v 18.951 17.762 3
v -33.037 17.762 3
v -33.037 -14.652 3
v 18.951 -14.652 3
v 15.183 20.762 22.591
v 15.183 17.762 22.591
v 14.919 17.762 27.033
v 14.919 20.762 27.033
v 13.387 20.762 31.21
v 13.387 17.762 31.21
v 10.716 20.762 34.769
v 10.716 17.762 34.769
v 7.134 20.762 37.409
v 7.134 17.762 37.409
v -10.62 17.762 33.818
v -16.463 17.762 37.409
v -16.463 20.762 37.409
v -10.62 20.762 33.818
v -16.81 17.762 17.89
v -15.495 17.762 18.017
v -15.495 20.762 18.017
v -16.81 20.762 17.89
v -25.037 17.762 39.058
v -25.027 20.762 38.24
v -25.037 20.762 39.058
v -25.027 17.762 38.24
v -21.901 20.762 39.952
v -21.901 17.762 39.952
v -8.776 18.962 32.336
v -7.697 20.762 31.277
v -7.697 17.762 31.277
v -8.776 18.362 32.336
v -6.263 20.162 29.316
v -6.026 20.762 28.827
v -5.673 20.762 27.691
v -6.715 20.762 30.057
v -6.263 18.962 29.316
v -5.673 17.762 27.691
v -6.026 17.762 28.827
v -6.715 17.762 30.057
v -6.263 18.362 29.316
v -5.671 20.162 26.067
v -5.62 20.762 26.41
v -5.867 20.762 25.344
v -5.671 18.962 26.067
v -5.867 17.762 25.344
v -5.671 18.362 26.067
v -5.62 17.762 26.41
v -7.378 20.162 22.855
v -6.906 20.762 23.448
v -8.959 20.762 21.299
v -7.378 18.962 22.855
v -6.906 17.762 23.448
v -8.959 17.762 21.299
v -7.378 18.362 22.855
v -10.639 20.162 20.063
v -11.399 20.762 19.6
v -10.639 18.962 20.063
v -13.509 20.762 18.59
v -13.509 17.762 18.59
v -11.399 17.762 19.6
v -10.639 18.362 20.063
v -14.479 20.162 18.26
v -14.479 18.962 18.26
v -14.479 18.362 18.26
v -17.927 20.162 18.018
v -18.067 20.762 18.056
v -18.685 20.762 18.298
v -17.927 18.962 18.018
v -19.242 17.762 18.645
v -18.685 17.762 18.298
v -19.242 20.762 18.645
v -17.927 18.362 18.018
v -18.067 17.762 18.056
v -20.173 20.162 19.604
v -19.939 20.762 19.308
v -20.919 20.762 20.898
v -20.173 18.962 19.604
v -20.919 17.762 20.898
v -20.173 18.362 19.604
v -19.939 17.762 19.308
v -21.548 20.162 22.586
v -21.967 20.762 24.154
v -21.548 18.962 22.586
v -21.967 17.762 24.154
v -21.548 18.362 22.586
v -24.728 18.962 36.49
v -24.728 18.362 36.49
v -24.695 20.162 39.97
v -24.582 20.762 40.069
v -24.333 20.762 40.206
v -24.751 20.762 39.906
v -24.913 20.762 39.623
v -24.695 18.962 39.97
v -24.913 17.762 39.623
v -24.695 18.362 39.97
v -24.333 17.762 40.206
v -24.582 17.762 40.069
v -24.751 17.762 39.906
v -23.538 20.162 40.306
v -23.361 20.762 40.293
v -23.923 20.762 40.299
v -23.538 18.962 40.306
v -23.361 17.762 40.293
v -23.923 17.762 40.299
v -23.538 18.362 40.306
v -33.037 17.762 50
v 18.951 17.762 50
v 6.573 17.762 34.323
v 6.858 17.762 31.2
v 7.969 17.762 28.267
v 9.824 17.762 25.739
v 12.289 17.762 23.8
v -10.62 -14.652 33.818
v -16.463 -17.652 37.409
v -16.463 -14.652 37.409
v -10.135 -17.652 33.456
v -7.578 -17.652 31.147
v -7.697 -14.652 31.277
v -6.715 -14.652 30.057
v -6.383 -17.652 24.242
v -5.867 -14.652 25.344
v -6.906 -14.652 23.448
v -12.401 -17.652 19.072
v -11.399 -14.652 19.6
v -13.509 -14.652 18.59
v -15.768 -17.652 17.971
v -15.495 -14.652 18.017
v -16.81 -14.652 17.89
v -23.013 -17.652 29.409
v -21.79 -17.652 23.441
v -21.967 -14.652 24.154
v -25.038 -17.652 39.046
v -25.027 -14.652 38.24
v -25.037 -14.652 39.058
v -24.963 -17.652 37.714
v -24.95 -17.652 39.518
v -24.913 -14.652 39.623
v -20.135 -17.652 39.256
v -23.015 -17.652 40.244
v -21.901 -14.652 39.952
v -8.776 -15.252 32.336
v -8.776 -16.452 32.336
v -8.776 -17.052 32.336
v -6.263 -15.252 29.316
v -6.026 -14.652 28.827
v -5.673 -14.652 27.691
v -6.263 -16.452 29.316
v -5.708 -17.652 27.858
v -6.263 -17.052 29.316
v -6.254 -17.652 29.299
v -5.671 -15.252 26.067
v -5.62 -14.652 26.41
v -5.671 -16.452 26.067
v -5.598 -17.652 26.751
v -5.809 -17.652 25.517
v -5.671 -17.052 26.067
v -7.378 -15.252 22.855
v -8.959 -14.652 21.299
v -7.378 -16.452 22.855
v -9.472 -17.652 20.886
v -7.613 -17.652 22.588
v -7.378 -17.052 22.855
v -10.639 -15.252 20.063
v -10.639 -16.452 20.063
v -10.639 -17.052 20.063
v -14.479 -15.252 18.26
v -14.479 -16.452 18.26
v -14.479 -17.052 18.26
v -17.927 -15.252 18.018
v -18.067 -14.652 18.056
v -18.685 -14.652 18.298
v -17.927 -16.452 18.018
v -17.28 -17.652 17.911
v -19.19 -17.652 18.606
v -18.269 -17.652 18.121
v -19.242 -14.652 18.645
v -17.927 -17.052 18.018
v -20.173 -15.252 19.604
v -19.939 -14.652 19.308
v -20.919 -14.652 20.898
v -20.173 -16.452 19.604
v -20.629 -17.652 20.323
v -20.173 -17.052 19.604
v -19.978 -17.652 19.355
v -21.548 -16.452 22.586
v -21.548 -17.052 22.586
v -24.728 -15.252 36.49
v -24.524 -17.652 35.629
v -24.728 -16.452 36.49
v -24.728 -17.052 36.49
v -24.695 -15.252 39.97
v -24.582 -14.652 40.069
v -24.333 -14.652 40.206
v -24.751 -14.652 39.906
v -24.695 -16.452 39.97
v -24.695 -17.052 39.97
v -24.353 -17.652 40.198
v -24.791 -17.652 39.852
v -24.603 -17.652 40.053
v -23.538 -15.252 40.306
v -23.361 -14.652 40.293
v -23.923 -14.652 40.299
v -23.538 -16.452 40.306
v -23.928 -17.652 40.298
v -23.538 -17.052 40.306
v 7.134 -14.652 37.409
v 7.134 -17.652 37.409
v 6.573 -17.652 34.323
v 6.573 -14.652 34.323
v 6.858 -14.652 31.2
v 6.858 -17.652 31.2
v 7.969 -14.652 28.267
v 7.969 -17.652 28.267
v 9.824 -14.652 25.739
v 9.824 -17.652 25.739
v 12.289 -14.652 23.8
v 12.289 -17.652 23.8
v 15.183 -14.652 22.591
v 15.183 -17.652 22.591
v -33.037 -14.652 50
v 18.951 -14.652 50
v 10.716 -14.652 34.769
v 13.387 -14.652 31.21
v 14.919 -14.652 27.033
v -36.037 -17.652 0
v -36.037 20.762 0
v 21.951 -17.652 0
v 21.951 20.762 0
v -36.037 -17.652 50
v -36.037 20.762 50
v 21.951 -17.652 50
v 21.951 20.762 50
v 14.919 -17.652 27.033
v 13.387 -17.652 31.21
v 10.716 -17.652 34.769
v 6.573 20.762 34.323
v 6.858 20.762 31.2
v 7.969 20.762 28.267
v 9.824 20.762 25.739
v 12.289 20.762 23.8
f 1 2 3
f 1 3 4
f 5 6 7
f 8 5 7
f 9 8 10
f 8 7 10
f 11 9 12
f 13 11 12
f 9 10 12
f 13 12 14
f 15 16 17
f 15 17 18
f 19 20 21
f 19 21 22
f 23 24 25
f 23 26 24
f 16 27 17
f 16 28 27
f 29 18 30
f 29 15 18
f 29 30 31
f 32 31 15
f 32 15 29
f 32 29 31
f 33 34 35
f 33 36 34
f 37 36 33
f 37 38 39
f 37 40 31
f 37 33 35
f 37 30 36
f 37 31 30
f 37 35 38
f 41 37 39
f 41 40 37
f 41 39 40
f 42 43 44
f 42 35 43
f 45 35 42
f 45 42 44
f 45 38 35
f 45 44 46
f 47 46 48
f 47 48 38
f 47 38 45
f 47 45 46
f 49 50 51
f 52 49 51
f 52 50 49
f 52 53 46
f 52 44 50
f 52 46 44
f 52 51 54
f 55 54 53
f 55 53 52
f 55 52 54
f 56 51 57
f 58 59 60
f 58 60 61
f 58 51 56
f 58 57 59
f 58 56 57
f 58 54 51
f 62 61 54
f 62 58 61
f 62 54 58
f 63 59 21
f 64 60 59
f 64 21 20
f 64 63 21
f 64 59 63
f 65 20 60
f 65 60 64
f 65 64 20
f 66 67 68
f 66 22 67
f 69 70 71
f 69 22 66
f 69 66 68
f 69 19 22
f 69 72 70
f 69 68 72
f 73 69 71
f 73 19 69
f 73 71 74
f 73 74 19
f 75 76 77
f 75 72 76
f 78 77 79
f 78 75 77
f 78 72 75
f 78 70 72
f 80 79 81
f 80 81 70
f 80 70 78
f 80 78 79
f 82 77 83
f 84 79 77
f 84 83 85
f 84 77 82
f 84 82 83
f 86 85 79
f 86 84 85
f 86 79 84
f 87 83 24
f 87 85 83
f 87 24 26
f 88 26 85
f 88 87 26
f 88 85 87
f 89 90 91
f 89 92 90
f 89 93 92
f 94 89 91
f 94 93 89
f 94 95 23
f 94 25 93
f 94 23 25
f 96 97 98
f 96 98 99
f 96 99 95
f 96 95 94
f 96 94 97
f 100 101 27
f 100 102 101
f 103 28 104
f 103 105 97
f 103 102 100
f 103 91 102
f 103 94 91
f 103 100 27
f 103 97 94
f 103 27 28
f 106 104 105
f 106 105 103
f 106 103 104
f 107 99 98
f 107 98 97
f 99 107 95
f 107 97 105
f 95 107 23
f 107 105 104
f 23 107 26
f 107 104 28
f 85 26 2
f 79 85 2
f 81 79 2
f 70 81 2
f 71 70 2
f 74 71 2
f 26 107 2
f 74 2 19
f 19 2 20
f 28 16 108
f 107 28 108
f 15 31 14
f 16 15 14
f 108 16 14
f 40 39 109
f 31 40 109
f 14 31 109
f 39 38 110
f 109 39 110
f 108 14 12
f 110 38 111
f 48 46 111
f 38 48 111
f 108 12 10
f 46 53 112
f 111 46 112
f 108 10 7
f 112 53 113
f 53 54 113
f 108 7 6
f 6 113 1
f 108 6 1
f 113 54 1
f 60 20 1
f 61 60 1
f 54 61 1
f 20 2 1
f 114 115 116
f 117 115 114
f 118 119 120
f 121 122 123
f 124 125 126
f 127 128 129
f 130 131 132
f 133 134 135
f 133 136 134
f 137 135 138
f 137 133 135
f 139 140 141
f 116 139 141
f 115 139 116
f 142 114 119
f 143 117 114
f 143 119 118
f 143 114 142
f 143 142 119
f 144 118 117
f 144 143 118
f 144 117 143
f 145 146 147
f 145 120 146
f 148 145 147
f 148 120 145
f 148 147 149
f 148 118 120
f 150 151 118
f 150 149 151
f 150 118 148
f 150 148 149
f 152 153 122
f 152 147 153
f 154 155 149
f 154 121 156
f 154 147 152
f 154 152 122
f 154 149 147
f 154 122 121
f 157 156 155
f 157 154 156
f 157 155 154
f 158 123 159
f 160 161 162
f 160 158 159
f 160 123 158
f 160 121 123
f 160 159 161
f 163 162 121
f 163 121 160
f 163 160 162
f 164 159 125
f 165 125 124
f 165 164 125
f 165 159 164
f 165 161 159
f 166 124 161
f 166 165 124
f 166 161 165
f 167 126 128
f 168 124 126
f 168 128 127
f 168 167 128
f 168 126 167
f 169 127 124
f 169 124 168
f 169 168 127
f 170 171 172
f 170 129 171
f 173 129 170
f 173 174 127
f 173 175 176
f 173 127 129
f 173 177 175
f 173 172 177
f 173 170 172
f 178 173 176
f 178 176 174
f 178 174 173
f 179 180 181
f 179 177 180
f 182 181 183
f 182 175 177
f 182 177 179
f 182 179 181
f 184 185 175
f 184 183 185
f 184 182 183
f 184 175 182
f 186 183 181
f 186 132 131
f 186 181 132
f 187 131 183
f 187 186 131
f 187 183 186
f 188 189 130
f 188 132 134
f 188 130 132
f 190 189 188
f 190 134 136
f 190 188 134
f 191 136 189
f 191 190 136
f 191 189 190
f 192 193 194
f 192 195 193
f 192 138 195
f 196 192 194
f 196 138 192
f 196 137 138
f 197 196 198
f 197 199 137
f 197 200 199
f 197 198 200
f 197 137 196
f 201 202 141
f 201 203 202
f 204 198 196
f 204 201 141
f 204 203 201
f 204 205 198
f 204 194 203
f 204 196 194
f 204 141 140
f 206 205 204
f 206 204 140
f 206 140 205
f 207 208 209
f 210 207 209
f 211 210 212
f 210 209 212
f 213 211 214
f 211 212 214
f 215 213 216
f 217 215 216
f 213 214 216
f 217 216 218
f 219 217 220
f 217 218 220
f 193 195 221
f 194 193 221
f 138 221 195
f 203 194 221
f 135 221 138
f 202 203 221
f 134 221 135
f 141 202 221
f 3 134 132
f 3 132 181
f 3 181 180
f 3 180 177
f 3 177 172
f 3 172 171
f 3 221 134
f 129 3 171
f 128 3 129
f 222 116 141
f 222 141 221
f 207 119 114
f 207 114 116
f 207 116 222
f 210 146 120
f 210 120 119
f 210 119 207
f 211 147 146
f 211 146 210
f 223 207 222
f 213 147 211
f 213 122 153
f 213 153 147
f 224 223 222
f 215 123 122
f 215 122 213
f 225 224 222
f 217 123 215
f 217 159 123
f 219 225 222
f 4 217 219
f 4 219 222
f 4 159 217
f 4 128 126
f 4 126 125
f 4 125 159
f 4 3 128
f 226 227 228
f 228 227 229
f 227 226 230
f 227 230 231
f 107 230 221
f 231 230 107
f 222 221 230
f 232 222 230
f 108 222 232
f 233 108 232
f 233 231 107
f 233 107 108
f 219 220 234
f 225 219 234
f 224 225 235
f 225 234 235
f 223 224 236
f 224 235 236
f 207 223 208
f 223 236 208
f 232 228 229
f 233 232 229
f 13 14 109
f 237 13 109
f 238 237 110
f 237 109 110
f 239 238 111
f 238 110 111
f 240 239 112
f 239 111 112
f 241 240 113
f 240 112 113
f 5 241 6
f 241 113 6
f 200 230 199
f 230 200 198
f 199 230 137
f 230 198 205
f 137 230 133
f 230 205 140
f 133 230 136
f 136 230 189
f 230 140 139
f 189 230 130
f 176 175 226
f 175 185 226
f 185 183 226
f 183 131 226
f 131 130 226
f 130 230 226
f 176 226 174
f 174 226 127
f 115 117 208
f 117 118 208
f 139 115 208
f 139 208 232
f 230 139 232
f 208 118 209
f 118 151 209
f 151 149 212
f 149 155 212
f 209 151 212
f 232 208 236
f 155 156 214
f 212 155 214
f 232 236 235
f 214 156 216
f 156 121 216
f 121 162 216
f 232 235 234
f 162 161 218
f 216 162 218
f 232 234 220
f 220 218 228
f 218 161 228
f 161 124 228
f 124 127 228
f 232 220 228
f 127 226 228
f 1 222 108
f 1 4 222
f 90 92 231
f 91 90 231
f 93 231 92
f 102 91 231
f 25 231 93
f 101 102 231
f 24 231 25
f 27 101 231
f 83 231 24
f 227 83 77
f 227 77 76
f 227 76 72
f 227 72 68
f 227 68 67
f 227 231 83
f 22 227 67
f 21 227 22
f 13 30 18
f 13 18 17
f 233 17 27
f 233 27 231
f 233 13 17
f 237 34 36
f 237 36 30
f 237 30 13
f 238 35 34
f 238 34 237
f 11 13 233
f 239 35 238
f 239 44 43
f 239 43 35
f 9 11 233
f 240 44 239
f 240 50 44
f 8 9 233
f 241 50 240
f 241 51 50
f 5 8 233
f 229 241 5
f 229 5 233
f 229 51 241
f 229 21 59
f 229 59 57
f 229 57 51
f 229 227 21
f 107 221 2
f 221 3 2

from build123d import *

# Parameters (mm, degrees)
F0_W     = 57.9878091812
F0_H     = 38.4146366268
F1_DEPTH = 50
F2_T     = -3
F4_DEPTH = 38.4156366268


with BuildPart() as f1:
    # F0 (on Top) → F1 (new body)
    with BuildSketch(Plane.XY):
        with Locations((-7.042683661, 1.5548774973)):
            Rectangle(F0_W, F0_H)
    extrude(amount=F1_DEPTH)

    # F2
    f2_openings = [f1.faces().sort_by_distance(p)[0] for p in [
        (-7.042684, 1.554877, 50),
    ]]
    offset(amount=F2_T, openings=f2_openings)

    # F3 (on face) → F4 (cut, through all)
    with BuildSketch(Plane.XZ.offset(17.6524408162)):
        with BuildLine():
            add(Edge.make_bspline(
                [(-16.4634156972, 37.4085381627), (-11.1890363739, 34.5487939189), (1.3150993888, 26.6227449202), (-21.2683478099, 12.525752902), (-22.3954826963, 30.3245935739), (-27.2033055371, 42.5719243048), (-20.3772871456, 39.5306212856), (-16.4634156972, 37.4085381627)],
                knots=[0, 0, 0, 0, 0.2260787274, 0.4448680265, 0.65498218, 0.8322374972, 1, 1, 1, 1], degree=3))
        make_face()
        with BuildLine():
            ThreePointArc((15.1829272509, 22.5914642215), (13.3867242374, 31.2103747375), (7.1341460571, 37.4085381627))
            ThreePointArc((7.1341460571, 37.4085381627), (7.9688071733, 28.2673085728), (15.1829272509, 22.5914642215))
        make_face()
    extrude(amount=-F4_DEPTH, mode=Mode.SUBTRACT)


solid = f1.part
